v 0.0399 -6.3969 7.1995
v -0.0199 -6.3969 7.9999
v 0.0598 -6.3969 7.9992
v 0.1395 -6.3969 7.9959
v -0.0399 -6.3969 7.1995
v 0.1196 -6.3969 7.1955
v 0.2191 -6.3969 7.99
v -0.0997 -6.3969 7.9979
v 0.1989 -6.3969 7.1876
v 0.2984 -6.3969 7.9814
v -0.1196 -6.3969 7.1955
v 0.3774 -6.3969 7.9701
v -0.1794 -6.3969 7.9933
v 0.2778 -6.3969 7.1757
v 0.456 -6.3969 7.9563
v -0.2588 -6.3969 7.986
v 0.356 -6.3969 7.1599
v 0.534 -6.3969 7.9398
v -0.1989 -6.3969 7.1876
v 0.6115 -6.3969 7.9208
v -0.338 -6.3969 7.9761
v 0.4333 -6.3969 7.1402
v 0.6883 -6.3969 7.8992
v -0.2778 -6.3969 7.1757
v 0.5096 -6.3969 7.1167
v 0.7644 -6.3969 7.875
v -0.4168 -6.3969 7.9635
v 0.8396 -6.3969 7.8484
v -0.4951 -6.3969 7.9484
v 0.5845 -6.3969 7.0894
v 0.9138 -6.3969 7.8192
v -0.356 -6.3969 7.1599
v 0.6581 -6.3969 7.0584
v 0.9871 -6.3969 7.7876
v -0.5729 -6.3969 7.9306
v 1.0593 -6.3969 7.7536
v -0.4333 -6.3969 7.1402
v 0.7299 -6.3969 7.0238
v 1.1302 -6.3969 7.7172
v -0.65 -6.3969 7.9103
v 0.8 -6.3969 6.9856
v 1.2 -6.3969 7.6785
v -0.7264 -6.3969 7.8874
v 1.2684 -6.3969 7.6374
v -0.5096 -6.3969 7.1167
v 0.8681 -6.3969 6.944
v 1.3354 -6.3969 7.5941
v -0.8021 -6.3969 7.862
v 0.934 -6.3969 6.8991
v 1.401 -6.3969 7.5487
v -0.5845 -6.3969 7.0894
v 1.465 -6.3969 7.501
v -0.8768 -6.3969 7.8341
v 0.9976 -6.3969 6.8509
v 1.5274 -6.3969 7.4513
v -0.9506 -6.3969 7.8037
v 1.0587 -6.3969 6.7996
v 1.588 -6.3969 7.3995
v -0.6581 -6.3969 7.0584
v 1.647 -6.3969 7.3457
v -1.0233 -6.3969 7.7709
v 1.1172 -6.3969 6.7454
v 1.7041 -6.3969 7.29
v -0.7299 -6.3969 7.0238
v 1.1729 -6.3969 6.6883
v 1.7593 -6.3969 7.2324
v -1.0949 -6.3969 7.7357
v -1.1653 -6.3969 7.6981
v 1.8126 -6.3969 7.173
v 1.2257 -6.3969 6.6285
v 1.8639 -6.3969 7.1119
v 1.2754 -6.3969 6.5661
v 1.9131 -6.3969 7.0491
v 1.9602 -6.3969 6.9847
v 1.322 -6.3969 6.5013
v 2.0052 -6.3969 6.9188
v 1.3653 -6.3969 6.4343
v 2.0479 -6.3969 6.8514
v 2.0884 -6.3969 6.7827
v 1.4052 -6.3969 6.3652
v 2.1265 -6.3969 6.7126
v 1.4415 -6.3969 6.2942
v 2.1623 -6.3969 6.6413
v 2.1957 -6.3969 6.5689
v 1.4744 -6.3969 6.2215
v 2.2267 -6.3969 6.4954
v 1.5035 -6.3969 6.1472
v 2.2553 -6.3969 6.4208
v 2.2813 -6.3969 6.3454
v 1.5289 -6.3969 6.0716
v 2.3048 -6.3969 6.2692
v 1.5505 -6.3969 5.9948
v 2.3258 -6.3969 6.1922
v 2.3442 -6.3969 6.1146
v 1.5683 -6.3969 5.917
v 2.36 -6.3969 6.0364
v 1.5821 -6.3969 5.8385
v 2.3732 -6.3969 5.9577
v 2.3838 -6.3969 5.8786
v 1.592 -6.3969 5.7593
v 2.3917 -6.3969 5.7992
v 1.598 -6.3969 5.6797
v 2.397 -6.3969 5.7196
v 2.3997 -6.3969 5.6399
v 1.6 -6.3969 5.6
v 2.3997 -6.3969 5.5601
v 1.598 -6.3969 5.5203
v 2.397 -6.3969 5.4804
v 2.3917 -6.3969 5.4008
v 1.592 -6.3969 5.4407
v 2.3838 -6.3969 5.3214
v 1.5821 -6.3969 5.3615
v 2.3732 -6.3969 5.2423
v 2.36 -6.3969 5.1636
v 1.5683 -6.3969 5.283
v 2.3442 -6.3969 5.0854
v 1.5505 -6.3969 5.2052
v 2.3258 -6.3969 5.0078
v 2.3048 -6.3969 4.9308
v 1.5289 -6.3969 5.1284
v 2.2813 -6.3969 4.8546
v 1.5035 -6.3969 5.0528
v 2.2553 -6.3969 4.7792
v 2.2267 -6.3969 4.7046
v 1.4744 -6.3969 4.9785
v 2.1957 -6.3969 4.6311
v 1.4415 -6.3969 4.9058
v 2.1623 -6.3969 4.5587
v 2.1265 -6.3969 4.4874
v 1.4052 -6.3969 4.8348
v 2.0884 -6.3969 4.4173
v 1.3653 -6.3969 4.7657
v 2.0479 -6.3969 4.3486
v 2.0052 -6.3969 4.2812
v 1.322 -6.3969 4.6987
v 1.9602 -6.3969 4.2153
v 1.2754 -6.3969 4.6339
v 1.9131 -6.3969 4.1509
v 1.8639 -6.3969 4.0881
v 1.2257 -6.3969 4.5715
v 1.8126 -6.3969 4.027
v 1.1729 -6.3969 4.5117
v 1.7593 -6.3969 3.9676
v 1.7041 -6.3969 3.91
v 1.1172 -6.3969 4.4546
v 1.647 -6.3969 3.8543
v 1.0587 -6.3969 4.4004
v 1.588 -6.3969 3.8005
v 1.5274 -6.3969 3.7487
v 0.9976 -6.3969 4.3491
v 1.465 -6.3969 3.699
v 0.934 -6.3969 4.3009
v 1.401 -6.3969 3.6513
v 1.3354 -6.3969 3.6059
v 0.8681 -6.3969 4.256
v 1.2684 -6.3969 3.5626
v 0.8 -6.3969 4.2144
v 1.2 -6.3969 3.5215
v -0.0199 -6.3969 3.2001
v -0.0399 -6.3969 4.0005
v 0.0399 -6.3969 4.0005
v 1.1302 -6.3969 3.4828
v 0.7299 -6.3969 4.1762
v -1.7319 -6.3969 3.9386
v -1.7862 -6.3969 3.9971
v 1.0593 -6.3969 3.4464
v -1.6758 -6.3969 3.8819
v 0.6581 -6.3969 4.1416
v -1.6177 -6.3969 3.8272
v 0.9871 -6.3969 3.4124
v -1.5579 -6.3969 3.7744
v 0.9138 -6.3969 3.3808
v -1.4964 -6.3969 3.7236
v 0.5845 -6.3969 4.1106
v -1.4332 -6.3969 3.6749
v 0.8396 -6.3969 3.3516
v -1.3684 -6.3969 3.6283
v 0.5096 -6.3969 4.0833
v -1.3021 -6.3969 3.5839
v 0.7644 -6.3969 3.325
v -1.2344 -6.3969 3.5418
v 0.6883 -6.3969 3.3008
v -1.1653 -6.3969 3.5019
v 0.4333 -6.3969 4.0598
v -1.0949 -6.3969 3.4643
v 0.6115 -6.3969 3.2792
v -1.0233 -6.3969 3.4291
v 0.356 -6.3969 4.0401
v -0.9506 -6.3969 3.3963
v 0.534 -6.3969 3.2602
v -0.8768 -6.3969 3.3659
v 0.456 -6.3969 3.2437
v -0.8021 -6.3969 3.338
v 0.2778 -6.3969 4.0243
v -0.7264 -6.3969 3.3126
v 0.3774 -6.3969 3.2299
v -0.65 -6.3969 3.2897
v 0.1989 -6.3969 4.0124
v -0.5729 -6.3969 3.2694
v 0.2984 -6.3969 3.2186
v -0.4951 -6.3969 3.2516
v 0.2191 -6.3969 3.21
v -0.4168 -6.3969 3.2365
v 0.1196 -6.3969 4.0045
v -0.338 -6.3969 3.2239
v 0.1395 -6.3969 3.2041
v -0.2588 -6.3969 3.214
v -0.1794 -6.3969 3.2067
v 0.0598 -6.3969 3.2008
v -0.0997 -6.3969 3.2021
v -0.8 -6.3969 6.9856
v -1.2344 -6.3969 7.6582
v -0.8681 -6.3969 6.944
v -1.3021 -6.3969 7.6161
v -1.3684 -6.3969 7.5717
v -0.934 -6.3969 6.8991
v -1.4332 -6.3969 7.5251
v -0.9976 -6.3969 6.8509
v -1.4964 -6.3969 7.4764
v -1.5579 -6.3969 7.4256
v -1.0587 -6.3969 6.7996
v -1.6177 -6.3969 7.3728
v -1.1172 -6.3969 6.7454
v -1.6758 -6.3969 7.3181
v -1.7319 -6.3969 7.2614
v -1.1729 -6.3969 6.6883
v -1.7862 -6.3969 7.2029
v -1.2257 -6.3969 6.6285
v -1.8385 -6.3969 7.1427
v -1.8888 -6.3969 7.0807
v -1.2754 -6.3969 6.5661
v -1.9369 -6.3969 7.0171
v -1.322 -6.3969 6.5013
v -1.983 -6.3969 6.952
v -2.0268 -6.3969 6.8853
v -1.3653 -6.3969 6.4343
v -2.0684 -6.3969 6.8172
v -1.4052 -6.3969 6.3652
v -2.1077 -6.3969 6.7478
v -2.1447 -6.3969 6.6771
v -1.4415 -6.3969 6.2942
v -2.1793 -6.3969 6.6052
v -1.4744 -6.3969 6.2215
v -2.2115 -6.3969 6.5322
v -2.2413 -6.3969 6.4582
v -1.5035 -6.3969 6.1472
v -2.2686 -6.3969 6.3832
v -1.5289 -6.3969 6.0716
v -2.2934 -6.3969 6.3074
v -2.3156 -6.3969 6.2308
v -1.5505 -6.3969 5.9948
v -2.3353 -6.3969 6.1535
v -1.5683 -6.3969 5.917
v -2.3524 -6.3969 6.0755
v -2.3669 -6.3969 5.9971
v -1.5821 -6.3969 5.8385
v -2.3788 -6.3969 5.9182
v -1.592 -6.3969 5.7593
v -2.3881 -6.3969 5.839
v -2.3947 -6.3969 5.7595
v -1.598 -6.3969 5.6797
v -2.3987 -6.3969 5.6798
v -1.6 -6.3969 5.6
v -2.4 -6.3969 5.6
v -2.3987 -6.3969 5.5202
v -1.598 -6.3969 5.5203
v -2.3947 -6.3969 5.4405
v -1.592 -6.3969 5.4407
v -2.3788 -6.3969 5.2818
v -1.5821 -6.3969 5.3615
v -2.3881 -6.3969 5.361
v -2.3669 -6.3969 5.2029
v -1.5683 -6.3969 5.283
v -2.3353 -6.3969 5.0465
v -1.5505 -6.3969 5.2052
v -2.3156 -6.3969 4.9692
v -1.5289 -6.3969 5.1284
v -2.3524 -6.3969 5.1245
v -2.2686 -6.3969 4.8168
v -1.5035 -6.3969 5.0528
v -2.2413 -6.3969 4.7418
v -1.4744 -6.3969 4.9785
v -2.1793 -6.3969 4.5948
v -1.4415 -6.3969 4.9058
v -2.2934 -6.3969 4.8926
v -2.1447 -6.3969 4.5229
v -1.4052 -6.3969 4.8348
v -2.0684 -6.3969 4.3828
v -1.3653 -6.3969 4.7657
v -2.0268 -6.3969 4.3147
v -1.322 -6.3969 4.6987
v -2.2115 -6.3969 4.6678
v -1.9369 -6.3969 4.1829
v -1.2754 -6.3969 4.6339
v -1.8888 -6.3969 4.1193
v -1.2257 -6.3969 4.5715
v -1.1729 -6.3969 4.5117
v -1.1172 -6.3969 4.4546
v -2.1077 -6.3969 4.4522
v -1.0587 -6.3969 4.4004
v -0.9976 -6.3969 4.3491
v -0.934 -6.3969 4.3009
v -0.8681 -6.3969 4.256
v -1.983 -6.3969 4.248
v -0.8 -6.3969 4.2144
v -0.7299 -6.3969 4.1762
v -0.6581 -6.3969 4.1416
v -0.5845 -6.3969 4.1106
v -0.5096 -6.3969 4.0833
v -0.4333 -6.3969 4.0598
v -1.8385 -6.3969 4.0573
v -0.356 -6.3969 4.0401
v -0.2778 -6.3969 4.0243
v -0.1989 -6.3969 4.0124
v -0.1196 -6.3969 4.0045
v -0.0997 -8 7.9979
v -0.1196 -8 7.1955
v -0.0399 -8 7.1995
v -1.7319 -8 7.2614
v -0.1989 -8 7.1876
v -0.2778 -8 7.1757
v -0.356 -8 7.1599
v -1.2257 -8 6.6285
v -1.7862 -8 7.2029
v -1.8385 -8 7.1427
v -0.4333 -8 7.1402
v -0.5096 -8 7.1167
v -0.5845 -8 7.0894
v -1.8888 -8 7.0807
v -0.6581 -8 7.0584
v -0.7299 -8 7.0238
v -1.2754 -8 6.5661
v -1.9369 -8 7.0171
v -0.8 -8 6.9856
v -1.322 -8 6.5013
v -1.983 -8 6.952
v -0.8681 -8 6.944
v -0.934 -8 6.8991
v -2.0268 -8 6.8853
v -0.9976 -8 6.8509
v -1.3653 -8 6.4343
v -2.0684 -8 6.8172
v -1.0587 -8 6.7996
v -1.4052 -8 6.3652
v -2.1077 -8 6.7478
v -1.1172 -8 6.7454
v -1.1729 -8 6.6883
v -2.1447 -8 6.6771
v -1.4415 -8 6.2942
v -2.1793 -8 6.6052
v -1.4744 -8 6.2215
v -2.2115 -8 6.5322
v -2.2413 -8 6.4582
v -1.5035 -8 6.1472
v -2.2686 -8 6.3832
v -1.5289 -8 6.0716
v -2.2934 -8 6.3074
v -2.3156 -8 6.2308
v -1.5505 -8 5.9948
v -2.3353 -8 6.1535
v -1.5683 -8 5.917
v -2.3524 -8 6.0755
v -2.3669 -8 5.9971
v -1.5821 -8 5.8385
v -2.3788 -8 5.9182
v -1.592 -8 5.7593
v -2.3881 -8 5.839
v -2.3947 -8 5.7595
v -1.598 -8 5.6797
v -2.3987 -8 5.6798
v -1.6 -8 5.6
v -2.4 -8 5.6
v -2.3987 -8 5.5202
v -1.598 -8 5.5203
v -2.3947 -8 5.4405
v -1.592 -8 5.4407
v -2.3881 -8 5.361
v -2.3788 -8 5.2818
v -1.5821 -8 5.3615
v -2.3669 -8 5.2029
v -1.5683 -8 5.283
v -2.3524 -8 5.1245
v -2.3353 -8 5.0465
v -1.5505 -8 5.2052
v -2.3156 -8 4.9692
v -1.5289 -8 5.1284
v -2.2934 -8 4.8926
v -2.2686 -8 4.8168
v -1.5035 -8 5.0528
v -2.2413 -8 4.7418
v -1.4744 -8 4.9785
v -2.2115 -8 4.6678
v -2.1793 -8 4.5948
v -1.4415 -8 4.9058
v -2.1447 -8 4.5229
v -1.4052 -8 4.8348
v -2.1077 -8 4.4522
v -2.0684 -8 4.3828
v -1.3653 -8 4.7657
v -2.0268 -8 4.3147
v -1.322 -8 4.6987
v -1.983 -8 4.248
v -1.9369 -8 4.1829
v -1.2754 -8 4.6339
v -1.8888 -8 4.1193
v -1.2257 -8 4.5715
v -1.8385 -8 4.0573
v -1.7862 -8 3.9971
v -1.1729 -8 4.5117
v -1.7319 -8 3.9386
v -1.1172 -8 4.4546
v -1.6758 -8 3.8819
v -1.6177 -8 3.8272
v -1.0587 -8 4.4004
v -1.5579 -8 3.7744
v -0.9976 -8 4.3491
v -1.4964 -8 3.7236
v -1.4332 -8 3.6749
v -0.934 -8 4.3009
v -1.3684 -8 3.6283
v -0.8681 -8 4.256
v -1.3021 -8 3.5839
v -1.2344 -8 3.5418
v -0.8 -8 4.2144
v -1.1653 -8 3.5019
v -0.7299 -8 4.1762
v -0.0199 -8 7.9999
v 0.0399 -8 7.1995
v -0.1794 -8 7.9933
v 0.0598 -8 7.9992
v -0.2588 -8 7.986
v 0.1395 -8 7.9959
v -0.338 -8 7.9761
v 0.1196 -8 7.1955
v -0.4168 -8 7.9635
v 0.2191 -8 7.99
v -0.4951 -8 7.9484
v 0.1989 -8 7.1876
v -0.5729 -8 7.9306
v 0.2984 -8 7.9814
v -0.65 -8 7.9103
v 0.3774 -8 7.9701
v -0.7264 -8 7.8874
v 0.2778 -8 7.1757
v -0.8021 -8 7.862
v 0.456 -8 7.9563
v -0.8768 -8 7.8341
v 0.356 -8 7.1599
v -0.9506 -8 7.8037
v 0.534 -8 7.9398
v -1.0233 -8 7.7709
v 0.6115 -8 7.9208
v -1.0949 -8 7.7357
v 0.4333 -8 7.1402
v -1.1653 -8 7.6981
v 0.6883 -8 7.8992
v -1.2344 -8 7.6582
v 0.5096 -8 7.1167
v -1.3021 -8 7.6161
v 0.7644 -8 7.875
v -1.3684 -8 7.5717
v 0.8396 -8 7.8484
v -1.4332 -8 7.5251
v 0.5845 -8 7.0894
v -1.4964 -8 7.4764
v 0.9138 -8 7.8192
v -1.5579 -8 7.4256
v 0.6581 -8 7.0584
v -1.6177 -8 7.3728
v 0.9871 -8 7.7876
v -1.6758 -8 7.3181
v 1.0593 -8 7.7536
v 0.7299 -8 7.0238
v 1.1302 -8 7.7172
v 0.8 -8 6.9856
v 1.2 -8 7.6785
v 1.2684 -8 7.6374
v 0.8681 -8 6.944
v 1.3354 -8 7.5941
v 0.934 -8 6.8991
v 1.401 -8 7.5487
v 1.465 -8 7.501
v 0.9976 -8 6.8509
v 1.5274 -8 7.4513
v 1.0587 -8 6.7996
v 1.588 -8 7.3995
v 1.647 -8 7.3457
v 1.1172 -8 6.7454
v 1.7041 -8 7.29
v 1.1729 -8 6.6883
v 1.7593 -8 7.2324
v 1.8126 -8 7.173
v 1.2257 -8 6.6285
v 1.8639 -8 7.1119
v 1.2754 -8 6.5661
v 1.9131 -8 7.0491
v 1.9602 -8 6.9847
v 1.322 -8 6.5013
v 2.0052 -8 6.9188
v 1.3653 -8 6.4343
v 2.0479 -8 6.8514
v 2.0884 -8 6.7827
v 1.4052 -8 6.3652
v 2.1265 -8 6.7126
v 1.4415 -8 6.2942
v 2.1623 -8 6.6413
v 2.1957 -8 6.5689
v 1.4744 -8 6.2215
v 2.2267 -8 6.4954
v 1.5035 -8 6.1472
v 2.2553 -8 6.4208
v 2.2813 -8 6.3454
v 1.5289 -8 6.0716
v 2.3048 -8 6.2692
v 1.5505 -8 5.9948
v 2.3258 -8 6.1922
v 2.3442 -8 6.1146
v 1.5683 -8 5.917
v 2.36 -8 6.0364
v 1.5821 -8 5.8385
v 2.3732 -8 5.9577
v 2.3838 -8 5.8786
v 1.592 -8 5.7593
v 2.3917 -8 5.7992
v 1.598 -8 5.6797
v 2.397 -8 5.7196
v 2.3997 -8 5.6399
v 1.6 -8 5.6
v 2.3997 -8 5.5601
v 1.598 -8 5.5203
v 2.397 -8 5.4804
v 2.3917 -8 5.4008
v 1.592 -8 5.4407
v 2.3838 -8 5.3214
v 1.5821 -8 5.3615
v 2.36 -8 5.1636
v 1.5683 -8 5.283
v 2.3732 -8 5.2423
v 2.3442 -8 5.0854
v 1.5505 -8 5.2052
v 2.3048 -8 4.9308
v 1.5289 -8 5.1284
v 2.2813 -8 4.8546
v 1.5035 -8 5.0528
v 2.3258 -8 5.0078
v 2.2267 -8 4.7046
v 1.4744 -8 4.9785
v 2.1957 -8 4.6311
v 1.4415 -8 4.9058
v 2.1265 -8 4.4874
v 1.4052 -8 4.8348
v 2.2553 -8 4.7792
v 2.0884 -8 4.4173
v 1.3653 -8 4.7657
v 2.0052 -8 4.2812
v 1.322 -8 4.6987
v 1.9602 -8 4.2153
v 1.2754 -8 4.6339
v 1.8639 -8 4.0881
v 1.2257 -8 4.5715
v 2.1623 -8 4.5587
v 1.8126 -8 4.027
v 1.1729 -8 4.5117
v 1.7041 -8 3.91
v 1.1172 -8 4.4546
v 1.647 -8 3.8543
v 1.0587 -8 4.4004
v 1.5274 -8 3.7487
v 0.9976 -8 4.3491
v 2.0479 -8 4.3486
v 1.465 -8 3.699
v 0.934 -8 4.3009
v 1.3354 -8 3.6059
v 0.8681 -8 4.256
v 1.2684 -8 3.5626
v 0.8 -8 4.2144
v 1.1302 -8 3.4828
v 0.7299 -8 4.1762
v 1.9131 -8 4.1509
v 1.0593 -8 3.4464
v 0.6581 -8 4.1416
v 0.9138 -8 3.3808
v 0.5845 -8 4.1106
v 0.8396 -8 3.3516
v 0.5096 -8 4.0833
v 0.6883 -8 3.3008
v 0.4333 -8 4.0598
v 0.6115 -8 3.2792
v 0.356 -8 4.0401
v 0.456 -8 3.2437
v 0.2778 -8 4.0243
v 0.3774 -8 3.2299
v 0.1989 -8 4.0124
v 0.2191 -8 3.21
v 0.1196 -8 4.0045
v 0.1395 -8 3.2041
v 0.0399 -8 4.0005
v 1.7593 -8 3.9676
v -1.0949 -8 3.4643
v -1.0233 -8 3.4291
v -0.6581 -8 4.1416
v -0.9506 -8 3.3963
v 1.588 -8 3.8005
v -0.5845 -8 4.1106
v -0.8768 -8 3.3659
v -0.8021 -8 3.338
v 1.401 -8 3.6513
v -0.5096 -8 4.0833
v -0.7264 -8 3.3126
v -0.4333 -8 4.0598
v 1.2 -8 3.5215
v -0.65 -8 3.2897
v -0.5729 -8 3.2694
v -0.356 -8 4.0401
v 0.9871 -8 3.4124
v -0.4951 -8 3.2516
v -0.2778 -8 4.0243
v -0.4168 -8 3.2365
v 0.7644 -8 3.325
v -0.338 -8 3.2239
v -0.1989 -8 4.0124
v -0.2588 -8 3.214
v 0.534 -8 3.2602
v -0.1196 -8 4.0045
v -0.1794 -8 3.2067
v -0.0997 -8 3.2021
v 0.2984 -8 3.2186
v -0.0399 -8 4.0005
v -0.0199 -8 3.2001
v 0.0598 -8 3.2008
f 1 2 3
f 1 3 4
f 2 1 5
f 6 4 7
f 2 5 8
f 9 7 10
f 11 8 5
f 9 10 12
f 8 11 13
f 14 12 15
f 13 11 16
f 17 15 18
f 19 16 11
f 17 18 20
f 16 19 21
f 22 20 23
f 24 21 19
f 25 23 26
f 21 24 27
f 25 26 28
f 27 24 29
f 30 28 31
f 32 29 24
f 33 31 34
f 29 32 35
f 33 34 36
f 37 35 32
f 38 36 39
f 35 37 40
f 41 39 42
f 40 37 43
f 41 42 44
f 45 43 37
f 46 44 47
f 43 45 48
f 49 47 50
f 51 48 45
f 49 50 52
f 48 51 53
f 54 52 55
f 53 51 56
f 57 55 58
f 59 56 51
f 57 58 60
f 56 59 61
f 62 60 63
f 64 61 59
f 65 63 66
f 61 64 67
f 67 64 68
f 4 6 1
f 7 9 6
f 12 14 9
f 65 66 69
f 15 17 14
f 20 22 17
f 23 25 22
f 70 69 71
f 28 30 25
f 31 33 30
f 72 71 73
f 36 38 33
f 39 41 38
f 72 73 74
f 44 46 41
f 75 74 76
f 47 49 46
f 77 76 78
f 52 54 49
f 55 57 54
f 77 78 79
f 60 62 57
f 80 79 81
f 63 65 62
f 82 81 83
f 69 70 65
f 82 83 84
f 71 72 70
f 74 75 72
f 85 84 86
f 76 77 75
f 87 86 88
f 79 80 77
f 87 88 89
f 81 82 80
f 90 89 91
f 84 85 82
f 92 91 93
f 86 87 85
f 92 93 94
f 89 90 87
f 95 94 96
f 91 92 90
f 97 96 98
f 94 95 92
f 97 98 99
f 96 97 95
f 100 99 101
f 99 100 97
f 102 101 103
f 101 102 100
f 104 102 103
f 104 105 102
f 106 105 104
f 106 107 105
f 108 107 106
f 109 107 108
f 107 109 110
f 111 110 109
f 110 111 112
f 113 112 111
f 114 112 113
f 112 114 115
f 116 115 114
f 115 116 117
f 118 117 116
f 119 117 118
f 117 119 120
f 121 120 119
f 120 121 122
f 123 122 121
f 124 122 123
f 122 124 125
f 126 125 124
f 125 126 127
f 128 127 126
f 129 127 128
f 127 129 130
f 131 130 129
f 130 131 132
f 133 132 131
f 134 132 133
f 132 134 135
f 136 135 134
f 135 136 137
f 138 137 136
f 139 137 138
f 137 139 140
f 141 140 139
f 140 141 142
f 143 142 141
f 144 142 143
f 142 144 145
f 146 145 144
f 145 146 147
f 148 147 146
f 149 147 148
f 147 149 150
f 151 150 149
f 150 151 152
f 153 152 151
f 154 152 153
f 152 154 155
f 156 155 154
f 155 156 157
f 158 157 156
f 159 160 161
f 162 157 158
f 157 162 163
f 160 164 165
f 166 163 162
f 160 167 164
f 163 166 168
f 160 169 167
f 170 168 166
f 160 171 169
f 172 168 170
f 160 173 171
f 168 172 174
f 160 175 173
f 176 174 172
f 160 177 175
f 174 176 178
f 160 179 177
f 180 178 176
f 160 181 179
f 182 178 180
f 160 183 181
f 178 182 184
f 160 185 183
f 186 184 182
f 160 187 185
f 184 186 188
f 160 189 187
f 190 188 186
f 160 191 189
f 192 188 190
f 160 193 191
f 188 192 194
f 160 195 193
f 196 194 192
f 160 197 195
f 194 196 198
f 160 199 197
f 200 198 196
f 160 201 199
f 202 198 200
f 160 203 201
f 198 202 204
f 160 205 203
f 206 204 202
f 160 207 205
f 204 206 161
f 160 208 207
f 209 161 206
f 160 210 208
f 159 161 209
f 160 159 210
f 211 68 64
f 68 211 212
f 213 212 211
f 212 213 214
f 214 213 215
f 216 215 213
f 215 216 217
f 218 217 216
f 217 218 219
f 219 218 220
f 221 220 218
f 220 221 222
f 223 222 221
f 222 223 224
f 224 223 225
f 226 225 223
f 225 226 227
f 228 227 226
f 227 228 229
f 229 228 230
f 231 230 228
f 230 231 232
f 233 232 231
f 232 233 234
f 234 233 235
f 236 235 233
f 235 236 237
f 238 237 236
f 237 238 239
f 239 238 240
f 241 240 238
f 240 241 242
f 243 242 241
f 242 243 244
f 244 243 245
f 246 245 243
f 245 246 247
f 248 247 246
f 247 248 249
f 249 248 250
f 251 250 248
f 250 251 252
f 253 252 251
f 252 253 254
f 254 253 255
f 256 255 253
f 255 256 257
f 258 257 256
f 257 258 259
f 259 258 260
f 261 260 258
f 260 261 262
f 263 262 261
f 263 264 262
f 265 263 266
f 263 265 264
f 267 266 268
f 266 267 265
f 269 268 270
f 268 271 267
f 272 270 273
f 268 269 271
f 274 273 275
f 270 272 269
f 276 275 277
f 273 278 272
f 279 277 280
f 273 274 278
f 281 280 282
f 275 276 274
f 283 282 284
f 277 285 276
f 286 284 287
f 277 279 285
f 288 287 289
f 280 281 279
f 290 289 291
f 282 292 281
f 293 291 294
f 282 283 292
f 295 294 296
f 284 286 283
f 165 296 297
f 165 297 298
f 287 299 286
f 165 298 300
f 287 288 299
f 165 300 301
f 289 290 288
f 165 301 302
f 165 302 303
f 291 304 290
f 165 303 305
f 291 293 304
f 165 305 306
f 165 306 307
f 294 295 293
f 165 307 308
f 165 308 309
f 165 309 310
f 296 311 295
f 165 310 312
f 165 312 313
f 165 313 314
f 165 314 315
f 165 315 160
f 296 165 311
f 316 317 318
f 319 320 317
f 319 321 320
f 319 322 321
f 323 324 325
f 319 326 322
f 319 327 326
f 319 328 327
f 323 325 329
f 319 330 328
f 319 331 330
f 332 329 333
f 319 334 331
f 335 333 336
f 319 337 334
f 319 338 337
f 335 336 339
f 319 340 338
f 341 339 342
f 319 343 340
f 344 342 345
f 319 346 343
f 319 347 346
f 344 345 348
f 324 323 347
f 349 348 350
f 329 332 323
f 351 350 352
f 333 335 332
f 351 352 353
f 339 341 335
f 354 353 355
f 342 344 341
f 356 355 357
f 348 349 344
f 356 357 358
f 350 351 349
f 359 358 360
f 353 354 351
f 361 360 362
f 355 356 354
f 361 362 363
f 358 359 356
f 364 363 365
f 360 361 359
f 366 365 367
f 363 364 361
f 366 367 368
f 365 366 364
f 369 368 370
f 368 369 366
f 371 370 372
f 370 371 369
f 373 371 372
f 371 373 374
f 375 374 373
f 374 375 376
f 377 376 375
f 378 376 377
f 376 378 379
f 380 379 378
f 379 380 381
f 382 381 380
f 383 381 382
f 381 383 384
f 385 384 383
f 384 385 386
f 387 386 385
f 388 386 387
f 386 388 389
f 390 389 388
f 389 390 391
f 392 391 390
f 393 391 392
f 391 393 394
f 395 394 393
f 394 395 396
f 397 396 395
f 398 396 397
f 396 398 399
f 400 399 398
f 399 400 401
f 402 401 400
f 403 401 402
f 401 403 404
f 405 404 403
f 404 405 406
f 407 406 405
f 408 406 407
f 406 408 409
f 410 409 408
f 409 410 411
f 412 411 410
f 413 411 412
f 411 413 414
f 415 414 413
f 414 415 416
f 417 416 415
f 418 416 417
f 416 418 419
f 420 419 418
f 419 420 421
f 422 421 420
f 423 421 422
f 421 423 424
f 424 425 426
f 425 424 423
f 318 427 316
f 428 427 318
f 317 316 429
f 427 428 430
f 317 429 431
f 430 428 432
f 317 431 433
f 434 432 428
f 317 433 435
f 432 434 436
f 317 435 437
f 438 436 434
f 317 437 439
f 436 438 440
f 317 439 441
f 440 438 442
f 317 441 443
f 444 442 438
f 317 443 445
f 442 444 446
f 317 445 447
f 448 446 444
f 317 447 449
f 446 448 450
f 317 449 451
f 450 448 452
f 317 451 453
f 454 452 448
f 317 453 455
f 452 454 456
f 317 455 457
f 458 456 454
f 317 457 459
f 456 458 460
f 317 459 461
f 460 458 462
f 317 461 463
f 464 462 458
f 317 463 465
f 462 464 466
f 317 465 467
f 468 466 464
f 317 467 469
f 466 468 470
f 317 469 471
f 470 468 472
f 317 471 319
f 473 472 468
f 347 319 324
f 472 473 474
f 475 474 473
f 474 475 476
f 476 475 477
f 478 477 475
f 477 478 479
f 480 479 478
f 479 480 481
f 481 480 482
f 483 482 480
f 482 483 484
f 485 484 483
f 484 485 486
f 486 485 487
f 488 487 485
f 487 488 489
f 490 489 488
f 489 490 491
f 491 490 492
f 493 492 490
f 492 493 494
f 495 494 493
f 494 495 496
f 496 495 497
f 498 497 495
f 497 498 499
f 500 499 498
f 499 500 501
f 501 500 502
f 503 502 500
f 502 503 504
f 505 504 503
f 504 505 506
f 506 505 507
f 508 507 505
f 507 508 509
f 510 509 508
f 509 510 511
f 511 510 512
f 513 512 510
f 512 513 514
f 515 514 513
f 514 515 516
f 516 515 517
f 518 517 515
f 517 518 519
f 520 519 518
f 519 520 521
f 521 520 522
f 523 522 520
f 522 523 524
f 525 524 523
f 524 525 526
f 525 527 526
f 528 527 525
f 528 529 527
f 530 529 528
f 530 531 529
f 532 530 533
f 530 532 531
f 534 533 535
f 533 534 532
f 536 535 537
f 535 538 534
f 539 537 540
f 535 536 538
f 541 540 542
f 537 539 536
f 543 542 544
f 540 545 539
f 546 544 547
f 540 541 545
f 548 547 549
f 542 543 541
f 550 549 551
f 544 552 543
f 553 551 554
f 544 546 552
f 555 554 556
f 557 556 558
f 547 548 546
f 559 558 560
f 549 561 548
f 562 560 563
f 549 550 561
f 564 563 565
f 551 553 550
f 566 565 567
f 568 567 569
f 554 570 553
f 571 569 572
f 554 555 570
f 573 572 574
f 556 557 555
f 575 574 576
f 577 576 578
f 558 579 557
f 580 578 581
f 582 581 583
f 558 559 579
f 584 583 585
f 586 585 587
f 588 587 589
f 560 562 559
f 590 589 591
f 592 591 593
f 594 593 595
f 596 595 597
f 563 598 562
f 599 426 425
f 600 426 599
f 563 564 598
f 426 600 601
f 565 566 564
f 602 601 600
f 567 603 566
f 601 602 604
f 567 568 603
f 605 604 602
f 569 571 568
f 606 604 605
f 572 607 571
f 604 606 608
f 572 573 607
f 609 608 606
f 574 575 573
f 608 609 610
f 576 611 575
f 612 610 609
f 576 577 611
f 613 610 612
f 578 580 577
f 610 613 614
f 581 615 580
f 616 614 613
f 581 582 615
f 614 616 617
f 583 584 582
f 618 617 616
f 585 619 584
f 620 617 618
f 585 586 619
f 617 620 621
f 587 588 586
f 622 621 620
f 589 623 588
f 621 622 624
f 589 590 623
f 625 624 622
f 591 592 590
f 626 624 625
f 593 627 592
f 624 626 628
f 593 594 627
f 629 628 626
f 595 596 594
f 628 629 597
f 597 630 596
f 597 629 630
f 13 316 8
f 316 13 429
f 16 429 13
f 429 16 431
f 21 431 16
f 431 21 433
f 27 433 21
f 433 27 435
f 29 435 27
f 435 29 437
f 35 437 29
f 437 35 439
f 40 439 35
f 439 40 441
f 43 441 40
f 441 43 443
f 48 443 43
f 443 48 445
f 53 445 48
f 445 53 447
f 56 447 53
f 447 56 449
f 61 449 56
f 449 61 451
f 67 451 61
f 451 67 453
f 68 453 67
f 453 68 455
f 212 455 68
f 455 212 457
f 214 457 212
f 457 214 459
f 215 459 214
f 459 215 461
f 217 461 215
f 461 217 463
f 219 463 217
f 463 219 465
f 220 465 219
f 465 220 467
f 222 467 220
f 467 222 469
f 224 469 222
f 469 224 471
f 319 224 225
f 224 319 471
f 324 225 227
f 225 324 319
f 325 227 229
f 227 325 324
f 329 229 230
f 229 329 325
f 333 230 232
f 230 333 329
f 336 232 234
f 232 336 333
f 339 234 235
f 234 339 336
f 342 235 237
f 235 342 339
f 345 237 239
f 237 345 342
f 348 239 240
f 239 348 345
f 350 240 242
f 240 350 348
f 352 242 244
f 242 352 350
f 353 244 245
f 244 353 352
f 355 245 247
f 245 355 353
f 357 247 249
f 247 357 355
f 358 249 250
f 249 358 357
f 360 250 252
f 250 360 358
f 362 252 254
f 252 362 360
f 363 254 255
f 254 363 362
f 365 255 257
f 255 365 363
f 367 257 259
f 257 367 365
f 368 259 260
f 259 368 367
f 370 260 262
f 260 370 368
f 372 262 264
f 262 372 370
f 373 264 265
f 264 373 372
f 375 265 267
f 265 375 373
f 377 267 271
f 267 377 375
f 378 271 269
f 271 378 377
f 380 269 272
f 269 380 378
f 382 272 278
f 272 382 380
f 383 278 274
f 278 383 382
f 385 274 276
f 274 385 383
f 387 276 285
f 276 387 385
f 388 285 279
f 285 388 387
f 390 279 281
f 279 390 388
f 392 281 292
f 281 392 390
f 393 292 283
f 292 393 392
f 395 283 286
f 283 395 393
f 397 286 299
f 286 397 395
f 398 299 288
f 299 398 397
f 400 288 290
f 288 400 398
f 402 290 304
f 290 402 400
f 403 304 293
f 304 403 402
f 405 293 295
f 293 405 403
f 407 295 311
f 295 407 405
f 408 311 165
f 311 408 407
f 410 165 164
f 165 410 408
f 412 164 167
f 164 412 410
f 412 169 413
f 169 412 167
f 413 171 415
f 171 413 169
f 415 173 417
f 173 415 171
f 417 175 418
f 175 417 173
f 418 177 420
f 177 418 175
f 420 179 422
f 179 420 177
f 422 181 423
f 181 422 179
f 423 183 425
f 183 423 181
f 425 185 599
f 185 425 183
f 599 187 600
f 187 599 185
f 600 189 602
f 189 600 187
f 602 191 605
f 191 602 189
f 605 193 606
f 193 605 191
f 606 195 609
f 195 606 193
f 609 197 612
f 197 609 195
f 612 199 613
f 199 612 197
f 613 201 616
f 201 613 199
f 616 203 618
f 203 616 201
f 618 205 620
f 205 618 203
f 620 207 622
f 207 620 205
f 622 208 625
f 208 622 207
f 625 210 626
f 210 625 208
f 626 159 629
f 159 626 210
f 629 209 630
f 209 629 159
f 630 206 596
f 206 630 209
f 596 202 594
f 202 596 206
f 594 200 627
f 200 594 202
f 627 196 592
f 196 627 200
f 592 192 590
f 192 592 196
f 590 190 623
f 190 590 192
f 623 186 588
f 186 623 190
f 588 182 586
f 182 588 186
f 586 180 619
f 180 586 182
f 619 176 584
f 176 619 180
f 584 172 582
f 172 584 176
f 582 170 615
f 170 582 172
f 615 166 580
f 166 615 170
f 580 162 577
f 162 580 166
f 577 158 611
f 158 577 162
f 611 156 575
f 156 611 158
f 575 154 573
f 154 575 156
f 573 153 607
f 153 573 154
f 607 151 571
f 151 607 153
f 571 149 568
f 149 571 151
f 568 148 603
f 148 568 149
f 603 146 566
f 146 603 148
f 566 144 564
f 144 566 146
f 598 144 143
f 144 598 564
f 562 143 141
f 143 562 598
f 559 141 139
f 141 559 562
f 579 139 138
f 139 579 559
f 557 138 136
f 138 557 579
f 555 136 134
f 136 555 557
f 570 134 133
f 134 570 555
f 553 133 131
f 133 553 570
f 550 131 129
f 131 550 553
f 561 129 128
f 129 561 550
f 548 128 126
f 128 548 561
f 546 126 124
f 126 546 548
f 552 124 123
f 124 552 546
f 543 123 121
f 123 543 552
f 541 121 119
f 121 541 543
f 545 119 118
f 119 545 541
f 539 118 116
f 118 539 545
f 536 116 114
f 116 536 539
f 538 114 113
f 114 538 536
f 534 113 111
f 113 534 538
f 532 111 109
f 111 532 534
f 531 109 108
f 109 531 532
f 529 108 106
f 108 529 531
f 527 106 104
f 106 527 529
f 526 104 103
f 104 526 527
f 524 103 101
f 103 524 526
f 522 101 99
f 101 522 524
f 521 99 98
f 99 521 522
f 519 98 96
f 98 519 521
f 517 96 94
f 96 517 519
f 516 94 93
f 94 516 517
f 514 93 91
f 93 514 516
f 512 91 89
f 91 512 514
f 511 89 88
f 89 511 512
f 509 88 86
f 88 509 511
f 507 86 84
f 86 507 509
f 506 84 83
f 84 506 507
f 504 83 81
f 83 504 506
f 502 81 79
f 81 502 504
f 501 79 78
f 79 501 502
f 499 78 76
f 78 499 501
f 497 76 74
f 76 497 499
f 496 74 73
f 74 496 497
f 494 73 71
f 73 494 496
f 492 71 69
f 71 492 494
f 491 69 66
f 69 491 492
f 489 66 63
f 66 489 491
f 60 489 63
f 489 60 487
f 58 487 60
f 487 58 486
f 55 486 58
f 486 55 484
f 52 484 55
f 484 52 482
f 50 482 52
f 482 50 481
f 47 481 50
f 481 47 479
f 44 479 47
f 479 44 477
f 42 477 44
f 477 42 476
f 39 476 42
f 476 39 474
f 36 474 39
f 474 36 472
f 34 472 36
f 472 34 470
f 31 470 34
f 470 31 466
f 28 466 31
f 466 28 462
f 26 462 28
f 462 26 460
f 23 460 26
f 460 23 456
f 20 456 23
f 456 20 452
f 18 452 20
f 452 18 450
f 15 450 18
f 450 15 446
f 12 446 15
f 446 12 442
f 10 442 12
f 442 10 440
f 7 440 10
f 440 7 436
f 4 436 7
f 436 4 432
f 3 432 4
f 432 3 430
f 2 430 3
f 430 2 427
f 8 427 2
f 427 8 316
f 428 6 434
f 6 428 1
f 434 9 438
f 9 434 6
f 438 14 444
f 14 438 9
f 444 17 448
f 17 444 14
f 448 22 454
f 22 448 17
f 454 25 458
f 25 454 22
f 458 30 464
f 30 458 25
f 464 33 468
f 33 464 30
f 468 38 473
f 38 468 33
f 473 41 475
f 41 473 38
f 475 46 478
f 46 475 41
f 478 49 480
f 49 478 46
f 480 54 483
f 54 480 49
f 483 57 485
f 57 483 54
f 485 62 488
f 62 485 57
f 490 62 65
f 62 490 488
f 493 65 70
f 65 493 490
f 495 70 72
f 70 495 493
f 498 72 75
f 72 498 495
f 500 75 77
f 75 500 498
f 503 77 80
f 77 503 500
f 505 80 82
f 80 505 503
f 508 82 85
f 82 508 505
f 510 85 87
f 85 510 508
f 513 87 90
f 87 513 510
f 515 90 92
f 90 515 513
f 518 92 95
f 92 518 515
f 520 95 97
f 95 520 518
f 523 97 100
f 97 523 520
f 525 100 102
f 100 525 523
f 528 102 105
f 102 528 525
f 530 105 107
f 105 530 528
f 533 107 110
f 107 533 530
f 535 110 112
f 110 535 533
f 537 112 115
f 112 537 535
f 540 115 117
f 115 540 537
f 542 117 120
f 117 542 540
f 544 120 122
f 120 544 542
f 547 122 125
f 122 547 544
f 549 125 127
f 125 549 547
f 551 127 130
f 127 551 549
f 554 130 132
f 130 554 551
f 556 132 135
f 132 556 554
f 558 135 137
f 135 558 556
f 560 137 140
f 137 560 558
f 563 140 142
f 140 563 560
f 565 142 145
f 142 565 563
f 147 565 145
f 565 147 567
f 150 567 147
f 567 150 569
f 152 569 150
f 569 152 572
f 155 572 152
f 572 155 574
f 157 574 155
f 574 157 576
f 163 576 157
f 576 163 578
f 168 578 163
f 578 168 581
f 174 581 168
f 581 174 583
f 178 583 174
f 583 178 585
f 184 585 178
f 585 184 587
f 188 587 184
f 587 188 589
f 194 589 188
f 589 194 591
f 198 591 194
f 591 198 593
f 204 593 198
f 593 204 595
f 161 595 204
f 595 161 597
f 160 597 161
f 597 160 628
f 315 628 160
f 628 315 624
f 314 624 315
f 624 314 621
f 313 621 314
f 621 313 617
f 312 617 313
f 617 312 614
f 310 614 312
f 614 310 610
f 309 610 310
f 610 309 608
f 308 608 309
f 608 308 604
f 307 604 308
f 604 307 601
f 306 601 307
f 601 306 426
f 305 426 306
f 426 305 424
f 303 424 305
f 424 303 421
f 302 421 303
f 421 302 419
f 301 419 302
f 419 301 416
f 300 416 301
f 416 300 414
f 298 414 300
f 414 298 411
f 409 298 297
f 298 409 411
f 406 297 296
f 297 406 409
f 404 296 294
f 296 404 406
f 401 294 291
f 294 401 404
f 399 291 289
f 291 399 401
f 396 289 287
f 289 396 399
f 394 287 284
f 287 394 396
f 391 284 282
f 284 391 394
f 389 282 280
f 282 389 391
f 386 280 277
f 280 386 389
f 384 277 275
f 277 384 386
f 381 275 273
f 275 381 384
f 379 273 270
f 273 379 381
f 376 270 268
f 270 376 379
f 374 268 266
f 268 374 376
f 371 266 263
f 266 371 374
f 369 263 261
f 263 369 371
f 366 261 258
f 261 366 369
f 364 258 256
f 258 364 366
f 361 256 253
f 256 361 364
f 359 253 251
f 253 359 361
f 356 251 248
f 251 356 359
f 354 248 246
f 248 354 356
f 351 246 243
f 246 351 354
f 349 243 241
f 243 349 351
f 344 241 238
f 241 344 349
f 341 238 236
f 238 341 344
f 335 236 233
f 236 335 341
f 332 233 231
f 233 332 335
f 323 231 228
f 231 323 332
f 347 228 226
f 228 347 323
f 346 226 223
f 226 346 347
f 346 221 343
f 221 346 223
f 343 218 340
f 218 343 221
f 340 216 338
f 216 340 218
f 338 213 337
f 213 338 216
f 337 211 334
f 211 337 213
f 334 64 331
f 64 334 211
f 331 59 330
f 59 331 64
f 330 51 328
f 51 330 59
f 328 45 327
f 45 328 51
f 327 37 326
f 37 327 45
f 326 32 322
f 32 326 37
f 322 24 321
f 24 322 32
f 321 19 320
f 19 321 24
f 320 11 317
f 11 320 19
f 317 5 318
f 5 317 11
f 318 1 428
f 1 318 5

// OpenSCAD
use <../lib.scad>
use <30189.scad>
use <30190c01.scad>
$fa=1; $fs=0.2;
function ldraw_lib__30189c01(realsolid=false) = [
// 0 ~Bike  3 Wheel Motorcycle Forks with White Wheel (Complete)
// 0 Name: 30189c01.dat
// 0 Author: Paul Easter [pneaster]
// 0 !LDRAW_ORG Shortcut UPDATE 2016-01
// 0 !LICENSE Licensed under CC BY 2.0 and CC BY 4.0 : see CAreadme.txt
// 
// 0 BFC CERTIFY CW
  [0,"BFC","CERTIFY"],
  [0,"BFC","CW"],
// 
// 0 !CATEGORY Vehicle
// 0 !KEYWORDS ATV, chopper, City Centre, cycle, minifig, Motor, motorbike, town
// 0 !KEYWORDS tricycle, Vehicle
// 
// 0 !HISTORY 2001-11-23 [pneaster] added BFC to speed up render time.
// 0 !HISTORY 2001-11-30 [PTadmin] Official Update 2001-02
// 0 !HISTORY 2002-04-25 [PTadmin] Official Update 2002-02
// 0 !HISTORY 2007-06-07 [PTadmin] Header formatted for Contributor Agreement
// 0 !HISTORY 2008-07-01 [PTadmin] Official Update 2008-01
// 0 !HISTORY 2012-12-28 [Steffen] changed category, extended title, used 30190c01.dat
// 0 !HISTORY 2016-12-31 [PTadmin] Official Update 2016-01
// 
// 
// 1 16 0 0 0 1 0 0 0 1 0 0 0 1 30189.dat
  [1,16,0,0,0,1,0,0,0,1,0,0,0,1, ldraw_lib__30189(realsolid)],
// 1 15 0 30 -20 0 0 -1 0 1 0 -1 0 0 30190c01.dat
  [1,15,0,30,-20,0,0,-1,0,1,0,-1,0,0, ldraw_lib__30190c01(realsolid)],
];
module ldraw_lib__30189c01(step=0, col=false, unit=2/5, alt=false, line=0.2, solid=!$preview)
    makepoly(ldraw_lib__30189c01(solid), step=step, col=col, unit=unit, alt=alt, line=line, solid=solid);
ldraw_lib__30189c01(line=0.2);
